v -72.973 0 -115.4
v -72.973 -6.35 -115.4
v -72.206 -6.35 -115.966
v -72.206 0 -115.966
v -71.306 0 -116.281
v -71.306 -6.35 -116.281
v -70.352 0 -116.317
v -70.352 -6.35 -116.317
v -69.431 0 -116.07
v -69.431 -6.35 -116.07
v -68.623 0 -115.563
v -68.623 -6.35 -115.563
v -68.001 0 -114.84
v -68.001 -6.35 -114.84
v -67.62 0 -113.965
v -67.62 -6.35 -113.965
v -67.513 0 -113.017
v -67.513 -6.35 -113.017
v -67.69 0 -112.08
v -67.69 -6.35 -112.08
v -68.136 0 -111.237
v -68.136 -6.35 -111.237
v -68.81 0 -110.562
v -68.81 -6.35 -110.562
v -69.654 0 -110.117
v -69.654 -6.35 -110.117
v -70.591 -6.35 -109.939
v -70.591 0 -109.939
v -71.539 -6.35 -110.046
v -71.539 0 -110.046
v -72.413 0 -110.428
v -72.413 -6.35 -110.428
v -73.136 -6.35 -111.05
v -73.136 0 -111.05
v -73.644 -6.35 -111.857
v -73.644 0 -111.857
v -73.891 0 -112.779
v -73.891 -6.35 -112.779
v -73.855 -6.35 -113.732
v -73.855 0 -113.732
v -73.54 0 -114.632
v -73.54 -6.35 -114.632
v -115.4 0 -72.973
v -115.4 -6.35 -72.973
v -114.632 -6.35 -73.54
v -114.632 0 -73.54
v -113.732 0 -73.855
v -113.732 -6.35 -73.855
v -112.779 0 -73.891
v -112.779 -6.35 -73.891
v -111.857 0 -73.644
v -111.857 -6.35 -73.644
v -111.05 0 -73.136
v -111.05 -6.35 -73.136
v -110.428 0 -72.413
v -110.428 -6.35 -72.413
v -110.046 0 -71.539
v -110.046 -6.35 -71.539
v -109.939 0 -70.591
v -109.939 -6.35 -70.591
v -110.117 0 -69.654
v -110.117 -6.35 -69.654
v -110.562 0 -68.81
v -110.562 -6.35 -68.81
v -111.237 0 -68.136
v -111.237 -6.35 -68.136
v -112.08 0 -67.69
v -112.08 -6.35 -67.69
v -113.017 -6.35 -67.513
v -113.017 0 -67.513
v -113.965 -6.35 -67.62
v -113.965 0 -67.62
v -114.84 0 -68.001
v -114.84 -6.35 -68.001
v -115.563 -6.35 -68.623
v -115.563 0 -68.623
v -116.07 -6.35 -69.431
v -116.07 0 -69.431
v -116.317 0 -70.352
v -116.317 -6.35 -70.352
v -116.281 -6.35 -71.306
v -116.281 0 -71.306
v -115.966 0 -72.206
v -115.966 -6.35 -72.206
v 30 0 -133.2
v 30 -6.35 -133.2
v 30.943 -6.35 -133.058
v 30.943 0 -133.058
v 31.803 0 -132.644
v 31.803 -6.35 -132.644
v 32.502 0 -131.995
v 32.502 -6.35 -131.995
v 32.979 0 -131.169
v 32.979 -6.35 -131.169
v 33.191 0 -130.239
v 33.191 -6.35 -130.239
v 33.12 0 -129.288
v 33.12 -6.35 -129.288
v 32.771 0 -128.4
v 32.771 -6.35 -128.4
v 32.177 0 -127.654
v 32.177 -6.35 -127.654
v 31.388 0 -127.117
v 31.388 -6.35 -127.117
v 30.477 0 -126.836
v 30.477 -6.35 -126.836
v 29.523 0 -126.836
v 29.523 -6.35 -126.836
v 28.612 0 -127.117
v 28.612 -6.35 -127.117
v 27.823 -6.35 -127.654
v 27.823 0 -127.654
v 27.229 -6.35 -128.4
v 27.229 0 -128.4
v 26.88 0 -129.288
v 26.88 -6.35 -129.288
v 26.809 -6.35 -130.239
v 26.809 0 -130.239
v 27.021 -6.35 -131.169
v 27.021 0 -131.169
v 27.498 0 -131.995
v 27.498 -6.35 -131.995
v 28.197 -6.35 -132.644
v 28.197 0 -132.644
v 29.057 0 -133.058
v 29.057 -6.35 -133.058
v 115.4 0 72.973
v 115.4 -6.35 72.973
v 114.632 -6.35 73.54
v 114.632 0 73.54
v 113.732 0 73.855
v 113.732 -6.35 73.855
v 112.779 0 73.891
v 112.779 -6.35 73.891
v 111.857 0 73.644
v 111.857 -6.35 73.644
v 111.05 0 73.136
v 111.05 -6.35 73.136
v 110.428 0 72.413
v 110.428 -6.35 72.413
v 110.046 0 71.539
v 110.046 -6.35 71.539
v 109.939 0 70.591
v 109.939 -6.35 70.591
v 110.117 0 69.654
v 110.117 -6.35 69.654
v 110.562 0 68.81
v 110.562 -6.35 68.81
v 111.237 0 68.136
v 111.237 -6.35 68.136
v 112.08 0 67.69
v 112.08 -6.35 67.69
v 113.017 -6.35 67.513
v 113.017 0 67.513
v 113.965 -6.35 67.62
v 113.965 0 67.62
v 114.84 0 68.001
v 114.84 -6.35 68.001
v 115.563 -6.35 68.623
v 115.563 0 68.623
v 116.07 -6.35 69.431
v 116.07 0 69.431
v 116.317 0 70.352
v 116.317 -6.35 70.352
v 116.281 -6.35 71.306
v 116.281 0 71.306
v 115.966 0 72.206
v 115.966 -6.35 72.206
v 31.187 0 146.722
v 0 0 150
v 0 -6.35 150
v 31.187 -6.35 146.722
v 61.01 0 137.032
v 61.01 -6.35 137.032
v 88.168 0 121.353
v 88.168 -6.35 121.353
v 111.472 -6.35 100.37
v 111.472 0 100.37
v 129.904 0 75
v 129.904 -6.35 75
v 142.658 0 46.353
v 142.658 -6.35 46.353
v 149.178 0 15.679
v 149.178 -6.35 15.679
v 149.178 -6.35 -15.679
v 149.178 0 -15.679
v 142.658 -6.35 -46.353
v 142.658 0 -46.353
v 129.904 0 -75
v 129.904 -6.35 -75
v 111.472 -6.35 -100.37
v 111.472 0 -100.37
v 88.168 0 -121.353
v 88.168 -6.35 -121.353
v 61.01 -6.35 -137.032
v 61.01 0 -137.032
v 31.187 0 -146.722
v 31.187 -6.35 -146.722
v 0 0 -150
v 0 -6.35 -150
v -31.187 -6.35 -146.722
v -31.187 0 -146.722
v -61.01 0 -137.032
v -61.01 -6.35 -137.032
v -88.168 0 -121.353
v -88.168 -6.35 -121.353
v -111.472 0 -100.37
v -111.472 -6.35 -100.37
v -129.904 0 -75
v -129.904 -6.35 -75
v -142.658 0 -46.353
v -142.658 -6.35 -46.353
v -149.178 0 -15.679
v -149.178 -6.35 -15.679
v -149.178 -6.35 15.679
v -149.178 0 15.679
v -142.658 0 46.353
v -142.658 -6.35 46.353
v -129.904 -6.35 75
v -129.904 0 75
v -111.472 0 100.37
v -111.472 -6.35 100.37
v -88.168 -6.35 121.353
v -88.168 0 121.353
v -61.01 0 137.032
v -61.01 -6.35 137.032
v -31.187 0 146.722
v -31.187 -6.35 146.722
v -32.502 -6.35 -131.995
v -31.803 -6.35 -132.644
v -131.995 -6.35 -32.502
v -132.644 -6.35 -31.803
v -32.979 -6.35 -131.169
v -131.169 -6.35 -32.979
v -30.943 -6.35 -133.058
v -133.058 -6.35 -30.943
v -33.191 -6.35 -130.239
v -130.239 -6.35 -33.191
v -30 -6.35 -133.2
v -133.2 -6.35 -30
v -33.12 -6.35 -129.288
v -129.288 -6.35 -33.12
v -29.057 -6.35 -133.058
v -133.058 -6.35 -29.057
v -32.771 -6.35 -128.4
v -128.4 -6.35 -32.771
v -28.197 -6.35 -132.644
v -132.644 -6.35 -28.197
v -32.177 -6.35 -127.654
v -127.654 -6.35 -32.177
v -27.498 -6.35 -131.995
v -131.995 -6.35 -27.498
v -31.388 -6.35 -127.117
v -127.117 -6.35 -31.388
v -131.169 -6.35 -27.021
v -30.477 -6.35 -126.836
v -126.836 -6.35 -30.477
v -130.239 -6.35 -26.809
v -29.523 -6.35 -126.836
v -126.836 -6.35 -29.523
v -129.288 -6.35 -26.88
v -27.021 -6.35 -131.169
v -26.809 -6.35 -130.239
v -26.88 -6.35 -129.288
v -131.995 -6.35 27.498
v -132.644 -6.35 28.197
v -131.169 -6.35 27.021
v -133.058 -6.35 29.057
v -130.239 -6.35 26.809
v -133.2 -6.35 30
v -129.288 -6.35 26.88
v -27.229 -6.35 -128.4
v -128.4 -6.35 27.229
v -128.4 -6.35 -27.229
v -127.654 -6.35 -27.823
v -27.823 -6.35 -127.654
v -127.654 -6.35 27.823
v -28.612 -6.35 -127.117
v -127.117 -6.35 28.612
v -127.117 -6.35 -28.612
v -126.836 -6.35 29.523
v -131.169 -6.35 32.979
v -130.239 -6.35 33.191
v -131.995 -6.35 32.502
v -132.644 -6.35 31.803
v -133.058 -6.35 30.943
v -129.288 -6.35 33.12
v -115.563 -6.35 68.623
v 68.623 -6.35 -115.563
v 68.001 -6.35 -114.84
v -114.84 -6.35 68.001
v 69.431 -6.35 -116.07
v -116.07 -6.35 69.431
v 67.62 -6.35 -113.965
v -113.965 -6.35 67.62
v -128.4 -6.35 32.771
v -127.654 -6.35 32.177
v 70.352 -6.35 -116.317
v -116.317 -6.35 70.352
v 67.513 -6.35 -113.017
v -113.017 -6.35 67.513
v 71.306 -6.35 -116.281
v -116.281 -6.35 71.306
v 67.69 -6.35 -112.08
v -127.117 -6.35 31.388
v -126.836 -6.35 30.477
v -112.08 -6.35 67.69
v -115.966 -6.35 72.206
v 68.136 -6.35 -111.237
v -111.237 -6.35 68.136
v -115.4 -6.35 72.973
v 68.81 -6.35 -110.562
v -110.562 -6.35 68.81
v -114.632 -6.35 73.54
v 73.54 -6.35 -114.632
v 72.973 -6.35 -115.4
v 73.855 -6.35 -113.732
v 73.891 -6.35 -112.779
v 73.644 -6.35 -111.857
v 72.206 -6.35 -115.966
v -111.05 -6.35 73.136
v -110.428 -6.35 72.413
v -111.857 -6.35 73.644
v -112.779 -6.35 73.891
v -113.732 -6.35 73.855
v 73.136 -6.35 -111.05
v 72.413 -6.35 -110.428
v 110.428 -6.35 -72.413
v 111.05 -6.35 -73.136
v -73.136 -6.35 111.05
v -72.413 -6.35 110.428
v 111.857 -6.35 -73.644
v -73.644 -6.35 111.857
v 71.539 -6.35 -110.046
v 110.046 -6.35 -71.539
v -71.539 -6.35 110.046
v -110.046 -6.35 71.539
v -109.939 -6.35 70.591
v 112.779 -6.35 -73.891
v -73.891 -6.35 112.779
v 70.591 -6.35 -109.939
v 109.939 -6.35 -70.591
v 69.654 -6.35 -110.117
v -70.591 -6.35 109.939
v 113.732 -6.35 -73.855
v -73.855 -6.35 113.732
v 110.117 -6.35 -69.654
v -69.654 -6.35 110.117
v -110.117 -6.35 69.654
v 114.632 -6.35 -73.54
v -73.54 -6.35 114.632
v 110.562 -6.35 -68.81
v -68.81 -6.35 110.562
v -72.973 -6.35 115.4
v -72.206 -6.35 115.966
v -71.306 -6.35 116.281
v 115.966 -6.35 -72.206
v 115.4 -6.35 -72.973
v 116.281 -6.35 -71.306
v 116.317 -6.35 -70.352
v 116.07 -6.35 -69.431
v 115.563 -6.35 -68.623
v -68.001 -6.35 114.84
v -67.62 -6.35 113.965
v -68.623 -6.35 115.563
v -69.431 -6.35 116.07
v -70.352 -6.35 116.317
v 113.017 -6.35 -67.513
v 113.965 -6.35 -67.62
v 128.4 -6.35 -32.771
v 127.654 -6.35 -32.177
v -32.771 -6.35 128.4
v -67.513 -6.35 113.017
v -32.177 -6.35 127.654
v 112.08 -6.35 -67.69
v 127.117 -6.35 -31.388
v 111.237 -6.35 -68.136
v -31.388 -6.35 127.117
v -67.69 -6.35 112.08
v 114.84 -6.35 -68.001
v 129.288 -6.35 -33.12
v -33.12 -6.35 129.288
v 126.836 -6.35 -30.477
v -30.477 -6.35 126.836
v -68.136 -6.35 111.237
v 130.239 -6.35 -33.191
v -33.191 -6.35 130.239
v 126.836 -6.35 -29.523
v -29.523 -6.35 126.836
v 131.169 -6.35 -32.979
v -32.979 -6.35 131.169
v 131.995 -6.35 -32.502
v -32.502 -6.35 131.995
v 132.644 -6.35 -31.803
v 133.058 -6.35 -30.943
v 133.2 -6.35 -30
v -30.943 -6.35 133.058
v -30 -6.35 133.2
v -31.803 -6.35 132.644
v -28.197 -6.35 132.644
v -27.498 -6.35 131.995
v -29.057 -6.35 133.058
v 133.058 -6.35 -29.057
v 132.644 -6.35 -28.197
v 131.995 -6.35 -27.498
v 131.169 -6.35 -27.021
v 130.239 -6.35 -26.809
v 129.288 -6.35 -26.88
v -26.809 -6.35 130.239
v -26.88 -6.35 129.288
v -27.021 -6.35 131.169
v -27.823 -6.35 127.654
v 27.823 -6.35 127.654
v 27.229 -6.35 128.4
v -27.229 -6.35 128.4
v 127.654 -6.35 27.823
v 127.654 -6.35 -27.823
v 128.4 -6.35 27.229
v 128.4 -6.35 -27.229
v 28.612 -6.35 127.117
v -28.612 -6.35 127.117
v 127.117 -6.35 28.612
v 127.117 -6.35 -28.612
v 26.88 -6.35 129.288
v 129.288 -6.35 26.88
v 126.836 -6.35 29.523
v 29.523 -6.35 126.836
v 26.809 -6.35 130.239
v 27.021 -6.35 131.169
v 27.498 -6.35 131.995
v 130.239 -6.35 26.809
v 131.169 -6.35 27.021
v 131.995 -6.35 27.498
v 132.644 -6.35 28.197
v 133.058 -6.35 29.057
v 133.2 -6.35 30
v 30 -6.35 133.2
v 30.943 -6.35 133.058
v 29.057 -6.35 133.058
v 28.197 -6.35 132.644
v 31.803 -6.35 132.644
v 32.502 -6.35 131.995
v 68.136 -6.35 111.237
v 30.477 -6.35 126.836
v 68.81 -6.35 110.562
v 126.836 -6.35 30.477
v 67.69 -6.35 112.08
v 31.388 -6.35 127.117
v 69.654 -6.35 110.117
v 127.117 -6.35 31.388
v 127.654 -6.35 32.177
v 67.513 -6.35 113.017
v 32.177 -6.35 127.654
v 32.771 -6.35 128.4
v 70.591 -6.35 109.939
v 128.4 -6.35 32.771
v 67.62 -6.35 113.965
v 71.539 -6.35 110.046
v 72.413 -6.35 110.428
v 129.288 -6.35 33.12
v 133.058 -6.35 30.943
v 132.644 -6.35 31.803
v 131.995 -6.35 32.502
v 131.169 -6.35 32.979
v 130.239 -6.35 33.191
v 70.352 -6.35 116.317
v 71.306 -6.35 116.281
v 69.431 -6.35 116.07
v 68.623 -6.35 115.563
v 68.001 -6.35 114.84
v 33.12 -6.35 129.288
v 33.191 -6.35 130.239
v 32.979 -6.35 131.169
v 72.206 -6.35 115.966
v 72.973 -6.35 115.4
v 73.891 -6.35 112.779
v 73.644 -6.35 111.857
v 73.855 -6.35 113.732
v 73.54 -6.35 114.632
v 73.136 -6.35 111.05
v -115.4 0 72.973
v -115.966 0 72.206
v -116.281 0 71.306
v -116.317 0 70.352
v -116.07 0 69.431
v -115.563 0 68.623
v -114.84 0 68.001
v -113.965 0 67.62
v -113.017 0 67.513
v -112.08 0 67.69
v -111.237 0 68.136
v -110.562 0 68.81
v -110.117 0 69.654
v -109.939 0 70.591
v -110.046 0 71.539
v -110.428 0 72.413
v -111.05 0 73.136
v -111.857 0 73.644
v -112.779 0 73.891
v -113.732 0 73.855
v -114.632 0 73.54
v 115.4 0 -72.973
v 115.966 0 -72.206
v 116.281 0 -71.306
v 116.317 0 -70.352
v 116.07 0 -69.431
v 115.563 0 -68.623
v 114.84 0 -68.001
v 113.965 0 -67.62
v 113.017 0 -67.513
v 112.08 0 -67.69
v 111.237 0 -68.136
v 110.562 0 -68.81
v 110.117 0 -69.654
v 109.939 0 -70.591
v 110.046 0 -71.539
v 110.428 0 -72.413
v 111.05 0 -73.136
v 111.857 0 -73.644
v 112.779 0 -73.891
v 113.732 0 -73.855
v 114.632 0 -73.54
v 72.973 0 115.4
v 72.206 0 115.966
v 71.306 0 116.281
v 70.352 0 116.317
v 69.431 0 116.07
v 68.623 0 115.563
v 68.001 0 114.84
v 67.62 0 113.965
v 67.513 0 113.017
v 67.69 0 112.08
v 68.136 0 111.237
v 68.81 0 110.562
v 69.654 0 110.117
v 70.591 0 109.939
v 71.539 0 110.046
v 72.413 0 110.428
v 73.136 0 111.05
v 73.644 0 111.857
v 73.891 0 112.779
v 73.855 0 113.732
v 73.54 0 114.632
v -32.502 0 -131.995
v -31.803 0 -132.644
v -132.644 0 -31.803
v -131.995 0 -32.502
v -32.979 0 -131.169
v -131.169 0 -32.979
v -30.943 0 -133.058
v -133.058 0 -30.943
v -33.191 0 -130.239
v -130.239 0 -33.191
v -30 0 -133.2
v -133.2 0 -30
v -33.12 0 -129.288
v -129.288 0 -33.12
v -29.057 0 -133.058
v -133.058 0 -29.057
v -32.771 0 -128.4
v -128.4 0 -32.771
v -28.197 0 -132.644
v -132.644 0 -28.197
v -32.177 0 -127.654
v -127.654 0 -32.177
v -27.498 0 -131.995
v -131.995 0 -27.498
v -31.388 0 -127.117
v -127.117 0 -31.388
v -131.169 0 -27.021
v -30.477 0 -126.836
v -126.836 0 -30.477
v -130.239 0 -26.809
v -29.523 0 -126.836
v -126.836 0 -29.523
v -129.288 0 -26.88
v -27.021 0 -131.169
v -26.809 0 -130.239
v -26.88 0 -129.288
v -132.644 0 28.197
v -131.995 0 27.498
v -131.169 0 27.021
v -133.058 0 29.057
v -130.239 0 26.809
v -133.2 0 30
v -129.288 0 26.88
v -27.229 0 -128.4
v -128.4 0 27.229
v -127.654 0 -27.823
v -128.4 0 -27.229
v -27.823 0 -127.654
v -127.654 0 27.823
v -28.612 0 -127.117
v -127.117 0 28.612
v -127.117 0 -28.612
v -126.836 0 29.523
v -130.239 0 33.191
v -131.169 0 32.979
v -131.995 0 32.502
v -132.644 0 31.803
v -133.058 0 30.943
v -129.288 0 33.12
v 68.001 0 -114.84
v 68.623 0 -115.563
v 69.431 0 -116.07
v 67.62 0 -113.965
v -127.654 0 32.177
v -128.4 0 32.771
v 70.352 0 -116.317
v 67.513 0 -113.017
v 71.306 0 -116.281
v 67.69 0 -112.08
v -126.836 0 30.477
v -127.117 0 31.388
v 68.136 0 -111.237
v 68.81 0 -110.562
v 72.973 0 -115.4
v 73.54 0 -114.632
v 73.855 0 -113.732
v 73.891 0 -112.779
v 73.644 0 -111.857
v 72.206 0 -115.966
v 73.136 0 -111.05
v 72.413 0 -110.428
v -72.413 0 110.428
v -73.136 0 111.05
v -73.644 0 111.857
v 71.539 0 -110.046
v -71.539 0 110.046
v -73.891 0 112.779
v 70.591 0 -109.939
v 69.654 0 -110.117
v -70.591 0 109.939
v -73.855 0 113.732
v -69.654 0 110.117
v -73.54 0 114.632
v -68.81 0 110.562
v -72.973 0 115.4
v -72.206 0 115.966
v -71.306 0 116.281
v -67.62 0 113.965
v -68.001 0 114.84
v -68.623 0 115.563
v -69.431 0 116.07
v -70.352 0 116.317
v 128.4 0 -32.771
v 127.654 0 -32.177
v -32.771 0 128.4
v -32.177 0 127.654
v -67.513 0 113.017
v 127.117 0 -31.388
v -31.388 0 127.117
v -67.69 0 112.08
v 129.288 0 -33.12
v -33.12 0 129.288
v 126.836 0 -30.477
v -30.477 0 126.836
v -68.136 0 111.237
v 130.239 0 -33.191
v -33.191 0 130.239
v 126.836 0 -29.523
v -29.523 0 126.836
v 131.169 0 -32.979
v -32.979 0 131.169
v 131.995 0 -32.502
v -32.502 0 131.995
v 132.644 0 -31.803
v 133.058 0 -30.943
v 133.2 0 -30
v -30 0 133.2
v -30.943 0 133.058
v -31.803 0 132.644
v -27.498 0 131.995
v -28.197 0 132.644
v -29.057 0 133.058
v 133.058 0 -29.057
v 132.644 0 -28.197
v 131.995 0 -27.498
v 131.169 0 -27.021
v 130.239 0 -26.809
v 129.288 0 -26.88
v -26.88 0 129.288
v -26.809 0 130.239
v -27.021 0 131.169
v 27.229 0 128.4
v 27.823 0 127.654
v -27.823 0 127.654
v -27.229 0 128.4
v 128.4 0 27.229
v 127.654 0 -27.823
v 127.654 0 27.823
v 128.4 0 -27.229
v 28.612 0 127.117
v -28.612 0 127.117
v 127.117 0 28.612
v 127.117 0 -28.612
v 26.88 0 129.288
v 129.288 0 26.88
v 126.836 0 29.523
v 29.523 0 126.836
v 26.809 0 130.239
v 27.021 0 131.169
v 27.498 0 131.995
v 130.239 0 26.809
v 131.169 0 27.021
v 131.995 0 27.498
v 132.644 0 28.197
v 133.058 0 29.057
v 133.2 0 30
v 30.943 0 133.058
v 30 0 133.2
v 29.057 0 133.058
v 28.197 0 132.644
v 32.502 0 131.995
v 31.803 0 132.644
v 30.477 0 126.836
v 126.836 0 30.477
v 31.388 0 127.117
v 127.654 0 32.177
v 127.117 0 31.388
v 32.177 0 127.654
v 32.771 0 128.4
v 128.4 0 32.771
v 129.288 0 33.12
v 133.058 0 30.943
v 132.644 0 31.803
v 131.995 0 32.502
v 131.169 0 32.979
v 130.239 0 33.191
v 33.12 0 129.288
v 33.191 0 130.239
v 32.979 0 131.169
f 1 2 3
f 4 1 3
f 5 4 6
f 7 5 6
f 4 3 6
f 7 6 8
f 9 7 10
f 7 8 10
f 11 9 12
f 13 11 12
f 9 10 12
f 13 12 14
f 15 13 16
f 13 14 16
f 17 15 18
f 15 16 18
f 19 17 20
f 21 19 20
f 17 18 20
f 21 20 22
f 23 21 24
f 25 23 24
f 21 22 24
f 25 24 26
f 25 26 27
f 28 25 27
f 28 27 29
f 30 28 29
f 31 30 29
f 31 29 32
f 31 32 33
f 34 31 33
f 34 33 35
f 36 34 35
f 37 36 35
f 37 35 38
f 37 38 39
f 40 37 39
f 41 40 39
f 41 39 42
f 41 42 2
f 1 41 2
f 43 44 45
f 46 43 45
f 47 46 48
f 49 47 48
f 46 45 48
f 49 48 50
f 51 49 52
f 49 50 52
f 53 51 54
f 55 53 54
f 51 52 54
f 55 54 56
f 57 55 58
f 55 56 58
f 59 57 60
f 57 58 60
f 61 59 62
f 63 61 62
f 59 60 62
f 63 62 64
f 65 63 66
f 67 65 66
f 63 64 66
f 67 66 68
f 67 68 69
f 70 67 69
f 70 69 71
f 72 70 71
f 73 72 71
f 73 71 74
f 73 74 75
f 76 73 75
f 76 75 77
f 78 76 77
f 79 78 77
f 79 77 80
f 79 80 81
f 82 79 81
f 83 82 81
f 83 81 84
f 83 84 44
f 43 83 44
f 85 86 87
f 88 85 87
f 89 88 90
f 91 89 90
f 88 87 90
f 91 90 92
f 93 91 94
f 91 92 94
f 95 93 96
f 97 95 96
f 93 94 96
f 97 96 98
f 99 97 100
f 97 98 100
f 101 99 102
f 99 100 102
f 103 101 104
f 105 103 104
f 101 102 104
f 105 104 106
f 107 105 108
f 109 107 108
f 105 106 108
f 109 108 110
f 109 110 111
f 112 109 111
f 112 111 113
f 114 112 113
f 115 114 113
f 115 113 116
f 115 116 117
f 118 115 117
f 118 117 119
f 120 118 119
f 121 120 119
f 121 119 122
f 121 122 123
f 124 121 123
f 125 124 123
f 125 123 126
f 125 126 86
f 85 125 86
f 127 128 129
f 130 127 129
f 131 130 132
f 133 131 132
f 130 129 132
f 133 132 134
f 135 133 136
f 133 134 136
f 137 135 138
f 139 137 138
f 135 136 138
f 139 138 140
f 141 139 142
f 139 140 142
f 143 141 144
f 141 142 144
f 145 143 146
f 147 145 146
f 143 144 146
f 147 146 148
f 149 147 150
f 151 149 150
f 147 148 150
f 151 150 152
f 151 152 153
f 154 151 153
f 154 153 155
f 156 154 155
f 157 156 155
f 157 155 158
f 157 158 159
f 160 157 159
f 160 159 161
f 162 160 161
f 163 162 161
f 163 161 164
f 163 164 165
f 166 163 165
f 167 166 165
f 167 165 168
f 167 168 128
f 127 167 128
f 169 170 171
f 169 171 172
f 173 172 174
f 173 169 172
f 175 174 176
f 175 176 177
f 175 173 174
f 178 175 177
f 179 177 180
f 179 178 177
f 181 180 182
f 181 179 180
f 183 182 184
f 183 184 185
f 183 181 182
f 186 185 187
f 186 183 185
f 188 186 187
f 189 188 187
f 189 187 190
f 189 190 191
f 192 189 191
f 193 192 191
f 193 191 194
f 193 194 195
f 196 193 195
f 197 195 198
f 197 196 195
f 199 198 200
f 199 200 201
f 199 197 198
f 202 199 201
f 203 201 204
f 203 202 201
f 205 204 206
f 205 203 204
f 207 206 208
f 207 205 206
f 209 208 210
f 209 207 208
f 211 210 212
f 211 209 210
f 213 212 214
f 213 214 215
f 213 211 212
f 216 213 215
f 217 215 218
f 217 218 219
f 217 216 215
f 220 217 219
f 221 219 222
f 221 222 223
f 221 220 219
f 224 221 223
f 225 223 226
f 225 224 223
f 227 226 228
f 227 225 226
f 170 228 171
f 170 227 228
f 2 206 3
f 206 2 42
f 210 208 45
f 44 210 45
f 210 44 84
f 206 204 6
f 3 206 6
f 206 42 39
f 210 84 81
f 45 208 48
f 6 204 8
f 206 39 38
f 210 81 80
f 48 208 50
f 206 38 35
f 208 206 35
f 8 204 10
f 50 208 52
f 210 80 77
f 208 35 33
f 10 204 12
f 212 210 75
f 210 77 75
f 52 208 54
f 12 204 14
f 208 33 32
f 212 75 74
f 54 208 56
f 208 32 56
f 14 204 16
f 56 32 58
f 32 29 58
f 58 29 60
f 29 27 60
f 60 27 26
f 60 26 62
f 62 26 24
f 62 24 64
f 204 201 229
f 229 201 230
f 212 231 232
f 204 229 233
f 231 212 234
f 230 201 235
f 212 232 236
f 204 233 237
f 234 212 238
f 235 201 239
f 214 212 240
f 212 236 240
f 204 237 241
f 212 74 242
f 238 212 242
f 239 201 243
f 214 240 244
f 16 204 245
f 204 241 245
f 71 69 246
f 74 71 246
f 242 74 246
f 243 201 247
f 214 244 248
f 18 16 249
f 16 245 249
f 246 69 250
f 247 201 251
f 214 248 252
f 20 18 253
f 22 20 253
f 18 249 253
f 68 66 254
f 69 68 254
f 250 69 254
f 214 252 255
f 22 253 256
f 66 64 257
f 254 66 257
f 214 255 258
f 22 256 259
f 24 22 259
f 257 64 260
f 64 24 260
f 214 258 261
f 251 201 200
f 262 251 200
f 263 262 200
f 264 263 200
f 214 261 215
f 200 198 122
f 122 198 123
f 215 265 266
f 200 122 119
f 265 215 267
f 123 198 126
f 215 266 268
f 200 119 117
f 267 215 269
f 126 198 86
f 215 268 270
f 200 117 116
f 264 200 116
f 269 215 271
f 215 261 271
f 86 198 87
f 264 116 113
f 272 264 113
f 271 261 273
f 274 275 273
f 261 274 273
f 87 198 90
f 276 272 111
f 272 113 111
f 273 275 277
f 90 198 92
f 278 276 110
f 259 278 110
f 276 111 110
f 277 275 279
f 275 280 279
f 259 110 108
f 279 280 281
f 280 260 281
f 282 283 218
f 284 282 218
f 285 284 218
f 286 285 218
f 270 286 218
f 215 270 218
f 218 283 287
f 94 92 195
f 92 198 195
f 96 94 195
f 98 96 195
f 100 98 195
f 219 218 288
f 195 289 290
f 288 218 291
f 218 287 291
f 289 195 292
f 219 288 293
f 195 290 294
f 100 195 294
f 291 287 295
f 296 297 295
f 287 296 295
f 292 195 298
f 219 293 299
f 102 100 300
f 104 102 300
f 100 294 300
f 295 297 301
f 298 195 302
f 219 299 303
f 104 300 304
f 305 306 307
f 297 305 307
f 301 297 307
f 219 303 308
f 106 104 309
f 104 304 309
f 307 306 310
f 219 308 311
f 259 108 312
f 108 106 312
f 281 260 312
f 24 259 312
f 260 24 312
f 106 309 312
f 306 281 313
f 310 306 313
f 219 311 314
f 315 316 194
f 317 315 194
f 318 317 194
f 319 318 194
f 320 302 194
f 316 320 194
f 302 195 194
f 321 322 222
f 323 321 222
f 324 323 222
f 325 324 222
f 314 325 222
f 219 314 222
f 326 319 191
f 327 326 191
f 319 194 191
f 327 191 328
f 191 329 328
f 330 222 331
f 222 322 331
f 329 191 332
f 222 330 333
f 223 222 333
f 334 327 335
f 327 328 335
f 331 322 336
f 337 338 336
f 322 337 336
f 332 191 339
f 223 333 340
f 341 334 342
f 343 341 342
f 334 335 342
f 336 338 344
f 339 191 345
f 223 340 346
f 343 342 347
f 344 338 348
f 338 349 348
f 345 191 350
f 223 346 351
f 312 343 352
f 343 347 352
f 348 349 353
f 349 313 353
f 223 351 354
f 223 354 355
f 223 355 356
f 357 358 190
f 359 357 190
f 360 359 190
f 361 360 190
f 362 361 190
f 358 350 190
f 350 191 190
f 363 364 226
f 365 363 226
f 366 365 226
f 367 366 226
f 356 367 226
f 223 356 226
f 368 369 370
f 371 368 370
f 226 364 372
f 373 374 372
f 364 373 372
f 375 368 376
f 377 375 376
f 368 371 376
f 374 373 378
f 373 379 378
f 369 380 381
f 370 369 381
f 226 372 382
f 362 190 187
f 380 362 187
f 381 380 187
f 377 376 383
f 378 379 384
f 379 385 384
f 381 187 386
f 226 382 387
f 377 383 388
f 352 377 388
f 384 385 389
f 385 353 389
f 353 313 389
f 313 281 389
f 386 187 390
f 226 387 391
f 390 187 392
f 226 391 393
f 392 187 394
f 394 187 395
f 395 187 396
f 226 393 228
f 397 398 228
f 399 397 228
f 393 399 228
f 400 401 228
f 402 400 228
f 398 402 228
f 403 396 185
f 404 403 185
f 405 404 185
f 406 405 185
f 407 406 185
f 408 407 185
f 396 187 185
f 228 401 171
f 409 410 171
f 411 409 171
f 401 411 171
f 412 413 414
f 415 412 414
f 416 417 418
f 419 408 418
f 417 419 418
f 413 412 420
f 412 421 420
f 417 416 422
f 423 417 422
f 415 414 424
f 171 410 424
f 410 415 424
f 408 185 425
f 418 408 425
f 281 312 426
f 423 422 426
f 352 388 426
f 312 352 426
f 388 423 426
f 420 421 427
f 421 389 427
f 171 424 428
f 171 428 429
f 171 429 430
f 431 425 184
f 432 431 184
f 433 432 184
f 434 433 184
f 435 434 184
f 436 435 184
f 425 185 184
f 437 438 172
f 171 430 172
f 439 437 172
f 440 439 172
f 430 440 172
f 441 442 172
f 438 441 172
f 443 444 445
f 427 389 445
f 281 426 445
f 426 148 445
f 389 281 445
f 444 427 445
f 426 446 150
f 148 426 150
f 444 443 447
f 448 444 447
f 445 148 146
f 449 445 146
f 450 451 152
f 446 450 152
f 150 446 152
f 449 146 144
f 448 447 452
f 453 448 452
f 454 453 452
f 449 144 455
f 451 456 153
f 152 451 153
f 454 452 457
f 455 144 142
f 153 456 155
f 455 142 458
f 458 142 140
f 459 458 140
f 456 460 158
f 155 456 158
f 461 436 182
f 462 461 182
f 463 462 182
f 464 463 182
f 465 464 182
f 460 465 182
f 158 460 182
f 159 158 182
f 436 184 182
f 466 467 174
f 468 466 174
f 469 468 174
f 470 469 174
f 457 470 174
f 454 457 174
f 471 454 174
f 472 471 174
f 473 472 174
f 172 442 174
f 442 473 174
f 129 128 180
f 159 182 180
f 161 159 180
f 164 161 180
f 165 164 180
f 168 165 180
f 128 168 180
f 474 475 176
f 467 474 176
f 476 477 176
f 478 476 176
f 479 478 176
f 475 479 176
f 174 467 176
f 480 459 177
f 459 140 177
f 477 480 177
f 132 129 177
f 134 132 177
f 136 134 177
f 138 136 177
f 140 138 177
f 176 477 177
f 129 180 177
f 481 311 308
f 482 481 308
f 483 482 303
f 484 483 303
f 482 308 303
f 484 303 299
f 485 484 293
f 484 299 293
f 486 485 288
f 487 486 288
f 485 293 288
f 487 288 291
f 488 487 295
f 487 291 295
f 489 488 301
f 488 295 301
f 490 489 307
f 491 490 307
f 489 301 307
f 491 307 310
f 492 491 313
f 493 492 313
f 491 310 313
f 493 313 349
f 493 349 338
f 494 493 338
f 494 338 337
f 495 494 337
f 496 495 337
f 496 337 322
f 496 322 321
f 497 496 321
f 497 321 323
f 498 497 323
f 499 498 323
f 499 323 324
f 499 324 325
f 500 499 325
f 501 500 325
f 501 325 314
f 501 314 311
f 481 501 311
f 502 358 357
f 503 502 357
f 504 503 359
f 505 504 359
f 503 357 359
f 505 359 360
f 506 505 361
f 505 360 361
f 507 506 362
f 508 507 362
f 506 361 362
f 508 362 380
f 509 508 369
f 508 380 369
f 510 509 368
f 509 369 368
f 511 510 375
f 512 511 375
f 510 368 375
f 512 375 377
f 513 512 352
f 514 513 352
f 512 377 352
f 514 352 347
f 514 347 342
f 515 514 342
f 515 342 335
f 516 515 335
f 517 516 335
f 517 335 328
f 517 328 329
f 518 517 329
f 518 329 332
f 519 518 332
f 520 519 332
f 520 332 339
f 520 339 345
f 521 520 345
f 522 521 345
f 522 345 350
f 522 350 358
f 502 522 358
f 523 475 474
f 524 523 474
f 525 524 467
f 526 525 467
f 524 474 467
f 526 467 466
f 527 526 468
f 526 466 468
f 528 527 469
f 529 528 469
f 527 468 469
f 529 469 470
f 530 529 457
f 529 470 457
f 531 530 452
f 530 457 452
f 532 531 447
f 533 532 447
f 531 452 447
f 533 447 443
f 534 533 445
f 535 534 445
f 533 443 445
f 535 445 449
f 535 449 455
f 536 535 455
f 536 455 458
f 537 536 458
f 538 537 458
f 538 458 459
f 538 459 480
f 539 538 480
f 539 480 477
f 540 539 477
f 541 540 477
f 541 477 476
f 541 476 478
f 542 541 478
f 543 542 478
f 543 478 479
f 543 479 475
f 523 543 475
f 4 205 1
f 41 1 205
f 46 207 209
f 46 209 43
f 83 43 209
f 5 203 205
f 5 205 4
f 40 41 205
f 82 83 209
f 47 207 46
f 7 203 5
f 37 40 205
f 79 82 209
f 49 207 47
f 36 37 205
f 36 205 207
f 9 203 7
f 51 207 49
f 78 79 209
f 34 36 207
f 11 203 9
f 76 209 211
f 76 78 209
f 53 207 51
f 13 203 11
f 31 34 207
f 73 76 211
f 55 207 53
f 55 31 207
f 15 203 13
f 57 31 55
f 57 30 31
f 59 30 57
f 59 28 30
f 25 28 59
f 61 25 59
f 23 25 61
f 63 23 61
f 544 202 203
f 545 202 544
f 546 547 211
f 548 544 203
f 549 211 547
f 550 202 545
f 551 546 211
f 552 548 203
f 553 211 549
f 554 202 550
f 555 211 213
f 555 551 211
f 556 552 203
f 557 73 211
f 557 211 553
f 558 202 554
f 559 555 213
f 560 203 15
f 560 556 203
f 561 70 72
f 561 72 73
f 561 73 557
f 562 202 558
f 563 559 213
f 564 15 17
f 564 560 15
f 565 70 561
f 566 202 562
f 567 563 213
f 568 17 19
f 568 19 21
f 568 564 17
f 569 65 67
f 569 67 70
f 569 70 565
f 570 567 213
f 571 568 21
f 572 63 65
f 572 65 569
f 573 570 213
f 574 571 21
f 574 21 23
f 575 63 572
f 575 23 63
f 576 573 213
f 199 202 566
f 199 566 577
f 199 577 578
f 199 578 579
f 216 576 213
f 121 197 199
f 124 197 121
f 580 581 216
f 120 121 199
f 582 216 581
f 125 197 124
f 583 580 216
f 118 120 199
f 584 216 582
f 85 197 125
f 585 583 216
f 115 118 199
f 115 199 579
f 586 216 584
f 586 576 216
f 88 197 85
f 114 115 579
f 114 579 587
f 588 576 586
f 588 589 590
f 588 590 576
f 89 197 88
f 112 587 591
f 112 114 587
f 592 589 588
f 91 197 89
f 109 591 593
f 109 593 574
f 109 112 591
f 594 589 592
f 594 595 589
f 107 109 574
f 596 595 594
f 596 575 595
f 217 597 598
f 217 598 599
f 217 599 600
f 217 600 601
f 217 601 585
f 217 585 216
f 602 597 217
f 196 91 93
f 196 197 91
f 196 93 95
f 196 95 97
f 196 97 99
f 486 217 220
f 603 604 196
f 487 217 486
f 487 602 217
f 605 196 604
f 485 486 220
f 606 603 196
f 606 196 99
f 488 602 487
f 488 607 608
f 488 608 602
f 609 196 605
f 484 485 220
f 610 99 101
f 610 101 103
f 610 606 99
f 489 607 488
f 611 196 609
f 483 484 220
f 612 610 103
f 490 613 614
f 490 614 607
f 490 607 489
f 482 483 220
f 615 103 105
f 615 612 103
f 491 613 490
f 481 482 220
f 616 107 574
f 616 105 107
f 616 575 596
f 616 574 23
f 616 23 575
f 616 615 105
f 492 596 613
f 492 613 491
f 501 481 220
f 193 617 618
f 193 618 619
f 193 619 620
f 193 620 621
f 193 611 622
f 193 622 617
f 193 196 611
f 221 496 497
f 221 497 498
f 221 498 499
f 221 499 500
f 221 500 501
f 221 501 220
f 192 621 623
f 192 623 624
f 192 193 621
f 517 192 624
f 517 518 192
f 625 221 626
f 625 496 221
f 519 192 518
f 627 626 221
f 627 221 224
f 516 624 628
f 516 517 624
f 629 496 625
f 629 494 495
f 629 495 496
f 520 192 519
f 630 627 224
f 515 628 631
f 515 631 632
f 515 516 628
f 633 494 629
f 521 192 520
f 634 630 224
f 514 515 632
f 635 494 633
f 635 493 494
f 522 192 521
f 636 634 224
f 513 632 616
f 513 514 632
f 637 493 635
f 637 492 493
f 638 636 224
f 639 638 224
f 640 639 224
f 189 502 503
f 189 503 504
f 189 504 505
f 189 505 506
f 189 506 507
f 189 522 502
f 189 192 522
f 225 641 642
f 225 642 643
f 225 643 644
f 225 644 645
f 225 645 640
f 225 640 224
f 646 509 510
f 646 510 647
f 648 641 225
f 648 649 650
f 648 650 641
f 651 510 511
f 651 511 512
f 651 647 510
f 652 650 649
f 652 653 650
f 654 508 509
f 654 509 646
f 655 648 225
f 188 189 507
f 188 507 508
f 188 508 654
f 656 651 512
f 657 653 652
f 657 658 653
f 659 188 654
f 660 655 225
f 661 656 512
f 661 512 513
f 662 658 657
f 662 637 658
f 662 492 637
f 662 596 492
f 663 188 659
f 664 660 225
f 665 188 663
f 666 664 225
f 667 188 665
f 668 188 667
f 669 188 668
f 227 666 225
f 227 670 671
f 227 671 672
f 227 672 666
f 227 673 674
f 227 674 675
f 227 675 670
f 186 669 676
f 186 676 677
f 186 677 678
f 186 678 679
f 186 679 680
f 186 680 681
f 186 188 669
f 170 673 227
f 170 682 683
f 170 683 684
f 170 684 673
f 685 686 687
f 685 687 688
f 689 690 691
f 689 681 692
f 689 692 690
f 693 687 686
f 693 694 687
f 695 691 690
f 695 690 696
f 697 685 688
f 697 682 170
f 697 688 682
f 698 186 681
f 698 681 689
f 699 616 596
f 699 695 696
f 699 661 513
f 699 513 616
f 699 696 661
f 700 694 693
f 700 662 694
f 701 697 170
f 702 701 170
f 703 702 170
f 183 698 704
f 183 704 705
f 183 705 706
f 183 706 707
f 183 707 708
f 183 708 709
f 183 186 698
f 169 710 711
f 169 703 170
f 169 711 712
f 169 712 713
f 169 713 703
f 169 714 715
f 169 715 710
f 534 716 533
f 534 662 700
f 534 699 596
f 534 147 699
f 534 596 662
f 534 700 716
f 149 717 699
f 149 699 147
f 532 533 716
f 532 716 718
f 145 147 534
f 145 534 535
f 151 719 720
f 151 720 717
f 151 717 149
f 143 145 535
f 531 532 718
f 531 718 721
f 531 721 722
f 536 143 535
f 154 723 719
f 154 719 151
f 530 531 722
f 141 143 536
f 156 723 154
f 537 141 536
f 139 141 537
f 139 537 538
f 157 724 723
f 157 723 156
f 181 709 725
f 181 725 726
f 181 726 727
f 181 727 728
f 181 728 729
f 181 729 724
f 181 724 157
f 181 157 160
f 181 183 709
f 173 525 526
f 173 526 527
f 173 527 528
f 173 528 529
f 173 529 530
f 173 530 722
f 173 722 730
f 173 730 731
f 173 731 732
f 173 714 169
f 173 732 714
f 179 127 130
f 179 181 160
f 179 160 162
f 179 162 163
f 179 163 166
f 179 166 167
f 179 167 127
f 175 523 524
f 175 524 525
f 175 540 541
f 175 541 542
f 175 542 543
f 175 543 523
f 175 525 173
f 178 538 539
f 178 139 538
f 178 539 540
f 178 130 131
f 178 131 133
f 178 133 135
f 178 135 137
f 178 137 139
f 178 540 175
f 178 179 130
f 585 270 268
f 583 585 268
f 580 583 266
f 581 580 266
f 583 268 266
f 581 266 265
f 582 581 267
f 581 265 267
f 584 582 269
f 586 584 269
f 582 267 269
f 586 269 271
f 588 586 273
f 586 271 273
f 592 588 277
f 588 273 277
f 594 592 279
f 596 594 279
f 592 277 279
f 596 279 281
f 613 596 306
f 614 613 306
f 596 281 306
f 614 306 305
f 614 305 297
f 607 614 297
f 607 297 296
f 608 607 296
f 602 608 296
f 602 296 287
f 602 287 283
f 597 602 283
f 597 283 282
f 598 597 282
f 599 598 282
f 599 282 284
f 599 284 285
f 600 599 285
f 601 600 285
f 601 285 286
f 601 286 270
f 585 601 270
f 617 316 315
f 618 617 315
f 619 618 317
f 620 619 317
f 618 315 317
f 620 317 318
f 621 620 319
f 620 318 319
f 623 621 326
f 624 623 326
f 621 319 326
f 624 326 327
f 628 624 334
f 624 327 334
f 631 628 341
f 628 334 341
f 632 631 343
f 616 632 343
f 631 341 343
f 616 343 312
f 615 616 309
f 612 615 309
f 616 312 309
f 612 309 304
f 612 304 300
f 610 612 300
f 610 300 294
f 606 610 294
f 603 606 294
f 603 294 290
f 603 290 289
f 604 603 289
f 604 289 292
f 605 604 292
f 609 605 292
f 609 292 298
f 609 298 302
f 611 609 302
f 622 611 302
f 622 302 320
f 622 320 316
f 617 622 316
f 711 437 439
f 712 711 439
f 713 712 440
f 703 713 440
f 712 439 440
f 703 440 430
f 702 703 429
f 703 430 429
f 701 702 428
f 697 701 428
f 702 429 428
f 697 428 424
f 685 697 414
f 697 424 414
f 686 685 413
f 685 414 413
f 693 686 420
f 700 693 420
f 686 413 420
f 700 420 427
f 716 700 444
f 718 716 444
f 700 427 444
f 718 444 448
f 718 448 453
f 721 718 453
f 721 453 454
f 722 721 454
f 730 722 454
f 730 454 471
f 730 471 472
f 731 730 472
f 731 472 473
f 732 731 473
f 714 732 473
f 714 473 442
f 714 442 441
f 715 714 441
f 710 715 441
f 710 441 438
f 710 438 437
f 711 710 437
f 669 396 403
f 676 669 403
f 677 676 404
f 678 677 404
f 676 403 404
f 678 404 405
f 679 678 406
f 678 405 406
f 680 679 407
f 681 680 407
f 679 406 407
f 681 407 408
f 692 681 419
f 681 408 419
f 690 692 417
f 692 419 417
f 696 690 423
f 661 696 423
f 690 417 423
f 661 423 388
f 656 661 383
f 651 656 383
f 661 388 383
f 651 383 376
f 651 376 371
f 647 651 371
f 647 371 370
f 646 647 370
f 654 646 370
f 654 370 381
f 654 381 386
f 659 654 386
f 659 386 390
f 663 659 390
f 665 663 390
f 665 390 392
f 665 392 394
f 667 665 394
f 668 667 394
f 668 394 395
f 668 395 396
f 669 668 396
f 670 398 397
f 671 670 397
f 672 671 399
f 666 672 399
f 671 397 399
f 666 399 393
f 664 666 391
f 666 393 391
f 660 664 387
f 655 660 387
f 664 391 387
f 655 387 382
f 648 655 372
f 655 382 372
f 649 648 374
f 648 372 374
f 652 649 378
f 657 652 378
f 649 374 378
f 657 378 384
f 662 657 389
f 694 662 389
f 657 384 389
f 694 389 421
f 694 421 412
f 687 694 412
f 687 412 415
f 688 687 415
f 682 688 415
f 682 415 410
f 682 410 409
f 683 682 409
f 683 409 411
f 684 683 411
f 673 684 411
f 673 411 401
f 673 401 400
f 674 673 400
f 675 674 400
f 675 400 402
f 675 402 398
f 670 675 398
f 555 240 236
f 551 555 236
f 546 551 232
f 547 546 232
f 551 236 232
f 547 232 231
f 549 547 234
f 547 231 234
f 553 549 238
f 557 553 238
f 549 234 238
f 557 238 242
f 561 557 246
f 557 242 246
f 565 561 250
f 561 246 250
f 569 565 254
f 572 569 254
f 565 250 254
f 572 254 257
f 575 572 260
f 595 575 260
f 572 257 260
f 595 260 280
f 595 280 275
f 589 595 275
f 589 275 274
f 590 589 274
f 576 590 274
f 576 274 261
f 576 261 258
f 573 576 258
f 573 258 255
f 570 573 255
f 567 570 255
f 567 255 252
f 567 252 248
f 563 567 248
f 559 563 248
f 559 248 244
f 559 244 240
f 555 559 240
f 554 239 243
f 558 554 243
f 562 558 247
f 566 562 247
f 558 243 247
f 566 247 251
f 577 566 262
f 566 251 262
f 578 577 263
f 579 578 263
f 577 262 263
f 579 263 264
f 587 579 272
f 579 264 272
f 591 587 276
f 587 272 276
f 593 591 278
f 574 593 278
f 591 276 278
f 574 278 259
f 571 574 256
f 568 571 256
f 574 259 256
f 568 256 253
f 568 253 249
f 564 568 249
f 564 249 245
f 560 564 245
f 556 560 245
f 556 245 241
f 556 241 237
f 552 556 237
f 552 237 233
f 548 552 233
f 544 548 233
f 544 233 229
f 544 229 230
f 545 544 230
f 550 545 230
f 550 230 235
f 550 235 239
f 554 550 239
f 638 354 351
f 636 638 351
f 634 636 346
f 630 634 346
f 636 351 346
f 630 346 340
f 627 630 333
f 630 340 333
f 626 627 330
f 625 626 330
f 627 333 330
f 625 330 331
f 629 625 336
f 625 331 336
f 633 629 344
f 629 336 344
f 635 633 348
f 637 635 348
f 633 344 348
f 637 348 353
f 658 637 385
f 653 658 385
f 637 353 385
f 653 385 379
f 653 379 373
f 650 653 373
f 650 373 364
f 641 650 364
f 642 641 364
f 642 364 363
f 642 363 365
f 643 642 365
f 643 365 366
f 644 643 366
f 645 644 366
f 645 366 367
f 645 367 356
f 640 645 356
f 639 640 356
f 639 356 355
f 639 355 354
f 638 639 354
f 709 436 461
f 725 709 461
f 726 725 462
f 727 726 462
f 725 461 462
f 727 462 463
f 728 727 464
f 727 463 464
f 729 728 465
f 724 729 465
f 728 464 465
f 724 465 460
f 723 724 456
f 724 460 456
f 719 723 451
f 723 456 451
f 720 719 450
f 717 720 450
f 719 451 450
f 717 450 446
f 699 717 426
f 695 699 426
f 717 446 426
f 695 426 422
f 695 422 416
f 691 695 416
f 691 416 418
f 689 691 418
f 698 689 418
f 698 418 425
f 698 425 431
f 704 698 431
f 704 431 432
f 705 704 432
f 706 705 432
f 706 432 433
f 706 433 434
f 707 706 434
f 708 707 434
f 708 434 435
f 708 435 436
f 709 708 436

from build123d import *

# Parameters (mm, degrees)
SKETCH1_R            = 150
BOSS_EXTRUDE1_DEPTH  = 6.35
M6_CLEARANCE_HOLE1_D = 6.4
CIRPATTERN1_COUNT    = 8


with BuildPart() as part:
    # Sketch1 → Boss-Extrude1 (new body)
    with BuildSketch(Plane(origin=(0, 0, 0), x_dir=(1, 0, 0), z_dir=(0, 1, 0))):
        with Locations(Location((0, 0, 0), (0, 0, 270))):
            Circle(SKETCH1_R)
    extrude(amount=-BOSS_EXTRUDE1_DEPTH)

    # M6 Clearance Hole1 (through all)
    with Locations(Plane(origin=(-30, 0, -130), x_dir=(0, 0, 1), z_dir=(0, 1, 0))):
        with Locations((0, 0), (0, 60)):
            m6_clearance_hole1 = Hole(M6_CLEARANCE_HOLE1_D / 2)

    # CirPattern1: M6 Clearance Hole1 ×8 about axis
    cirpattern1_axis = Axis((0, 0, 0), (0, 1, 0))
    for i in range(1, CIRPATTERN1_COUNT):
        add(m6_clearance_hole1.rotate(cirpattern1_axis, i * 360 / CIRPATTERN1_COUNT), mode=Mode.SUBTRACT)


solid = part.part
